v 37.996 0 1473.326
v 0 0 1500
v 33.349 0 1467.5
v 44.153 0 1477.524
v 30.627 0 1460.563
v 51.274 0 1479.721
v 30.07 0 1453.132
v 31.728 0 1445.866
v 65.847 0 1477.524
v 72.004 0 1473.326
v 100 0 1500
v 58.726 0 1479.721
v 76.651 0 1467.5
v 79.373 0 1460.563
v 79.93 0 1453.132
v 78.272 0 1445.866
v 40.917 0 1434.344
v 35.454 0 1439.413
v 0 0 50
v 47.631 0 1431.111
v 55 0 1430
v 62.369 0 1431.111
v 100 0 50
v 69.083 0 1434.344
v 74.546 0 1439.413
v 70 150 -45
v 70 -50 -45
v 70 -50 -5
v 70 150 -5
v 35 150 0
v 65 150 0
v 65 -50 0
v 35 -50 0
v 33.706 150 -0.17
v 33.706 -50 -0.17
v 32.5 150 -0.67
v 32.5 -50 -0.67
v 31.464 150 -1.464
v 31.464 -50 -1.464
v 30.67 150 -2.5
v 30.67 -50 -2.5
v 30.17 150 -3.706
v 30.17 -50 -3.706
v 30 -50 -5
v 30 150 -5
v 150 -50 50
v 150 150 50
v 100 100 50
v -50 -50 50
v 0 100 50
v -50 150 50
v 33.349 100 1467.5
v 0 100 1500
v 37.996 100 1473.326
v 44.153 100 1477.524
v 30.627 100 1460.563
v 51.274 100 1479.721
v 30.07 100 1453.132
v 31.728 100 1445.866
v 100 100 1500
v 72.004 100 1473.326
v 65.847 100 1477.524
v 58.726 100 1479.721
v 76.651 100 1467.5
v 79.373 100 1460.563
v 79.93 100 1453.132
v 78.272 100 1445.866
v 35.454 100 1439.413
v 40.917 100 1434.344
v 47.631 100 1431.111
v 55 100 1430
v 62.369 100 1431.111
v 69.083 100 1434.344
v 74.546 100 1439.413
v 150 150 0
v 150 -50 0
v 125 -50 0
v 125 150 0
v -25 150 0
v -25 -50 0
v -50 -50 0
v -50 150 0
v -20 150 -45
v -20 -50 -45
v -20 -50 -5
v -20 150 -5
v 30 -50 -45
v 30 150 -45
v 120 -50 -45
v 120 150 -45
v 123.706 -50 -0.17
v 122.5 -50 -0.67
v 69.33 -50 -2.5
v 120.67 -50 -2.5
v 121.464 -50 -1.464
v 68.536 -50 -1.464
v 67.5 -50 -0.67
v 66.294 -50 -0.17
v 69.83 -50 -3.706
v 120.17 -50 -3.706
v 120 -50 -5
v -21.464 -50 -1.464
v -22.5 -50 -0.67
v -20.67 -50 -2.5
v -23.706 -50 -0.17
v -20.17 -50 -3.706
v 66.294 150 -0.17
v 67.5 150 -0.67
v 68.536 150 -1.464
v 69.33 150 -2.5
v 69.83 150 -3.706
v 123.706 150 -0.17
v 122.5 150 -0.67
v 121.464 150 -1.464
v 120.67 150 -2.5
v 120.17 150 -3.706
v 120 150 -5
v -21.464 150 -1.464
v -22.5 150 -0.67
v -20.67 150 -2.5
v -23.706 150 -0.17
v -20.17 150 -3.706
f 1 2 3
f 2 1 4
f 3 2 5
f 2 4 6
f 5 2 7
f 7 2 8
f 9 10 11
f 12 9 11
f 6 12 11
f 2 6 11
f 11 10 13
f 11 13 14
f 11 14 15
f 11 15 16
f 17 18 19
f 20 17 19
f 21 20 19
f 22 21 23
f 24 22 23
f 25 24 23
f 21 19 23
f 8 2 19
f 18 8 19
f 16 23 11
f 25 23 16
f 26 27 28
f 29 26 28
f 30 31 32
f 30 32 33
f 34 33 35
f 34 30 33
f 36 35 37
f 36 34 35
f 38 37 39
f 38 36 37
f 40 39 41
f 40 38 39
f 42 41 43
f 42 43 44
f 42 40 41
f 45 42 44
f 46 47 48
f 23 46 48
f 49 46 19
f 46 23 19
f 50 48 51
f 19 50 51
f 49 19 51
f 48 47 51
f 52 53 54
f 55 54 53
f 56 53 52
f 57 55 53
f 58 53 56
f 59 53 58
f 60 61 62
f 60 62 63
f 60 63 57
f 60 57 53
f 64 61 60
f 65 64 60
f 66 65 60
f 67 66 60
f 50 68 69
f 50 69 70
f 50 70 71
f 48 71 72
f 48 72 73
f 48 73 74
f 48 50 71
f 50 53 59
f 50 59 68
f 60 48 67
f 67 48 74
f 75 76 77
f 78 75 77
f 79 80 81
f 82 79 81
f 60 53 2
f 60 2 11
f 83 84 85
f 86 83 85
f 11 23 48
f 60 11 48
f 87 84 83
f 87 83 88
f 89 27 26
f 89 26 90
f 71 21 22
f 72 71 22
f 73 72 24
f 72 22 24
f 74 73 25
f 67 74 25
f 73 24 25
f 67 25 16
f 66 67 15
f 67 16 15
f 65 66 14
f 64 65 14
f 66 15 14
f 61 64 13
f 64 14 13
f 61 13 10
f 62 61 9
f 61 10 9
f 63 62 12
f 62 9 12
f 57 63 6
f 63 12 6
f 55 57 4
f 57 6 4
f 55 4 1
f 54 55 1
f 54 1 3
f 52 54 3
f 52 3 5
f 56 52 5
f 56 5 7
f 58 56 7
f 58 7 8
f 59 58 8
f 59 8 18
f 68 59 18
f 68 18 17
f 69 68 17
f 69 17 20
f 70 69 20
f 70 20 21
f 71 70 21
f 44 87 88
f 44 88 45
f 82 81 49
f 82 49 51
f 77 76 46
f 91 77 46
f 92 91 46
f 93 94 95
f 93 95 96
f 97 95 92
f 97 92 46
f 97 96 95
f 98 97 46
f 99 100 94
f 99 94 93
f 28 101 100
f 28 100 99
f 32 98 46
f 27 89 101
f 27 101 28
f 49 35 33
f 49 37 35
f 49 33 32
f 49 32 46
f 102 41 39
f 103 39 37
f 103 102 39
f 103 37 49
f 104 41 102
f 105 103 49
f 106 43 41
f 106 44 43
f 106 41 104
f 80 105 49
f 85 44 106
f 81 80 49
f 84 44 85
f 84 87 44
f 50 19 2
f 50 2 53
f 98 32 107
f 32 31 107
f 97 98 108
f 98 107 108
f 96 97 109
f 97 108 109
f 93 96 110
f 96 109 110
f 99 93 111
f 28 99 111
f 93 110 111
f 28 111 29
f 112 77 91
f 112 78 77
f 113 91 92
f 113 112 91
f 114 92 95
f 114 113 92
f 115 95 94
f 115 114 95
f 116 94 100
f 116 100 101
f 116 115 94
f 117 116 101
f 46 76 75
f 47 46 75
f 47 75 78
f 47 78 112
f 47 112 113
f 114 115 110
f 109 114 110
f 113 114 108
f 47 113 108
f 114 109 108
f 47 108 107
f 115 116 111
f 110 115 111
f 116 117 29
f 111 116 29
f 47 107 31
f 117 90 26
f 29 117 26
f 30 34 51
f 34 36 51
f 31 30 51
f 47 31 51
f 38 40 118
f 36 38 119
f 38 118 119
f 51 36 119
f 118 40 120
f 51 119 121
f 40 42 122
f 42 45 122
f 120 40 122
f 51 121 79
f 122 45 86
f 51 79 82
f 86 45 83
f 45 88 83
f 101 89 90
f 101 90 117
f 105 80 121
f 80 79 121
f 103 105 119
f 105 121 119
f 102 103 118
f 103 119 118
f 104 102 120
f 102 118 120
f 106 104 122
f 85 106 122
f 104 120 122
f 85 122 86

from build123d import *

# Parameters (mm, degrees)
SKETCH2_W           = 100
SKETCH2_H           = 100
BOSS_EXTRUDE1_DEPTH = 1500
CUT_EXTRUDE1_REACH  = 1508.652
SKETCH3_R           = 25
SKETCH4_W           = 200
SKETCH4_H           = 200
BOSS_EXTRUDE2_DEPTH = 50
SKETCH5_W           = 50
SKETCH5_H           = 45
BOSS_EXTRUDE3_DEPTH = 200
FILLET1_R           = 5


with BuildPart() as part:
    # Sketch2 → Boss-Extrude1 (new body)
    with BuildSketch(Plane.XY):
        with Locations((50, 50)):
            Rectangle(SKETCH2_W, SKETCH2_H)
    extrude(amount=BOSS_EXTRUDE1_DEPTH)

    # Sketch3 → Cut-Extrude1 (cut, up to next)
    with BuildSketch(Plane.XZ, mode=Mode.PRIVATE) as cut_extrude1_sk1:
        with Locations(Location((55, 1455, 0), (0, 0, 270))):
            Circle(SKETCH3_R)
    cut_extrude1_tool1 = extrude(cut_extrude1_sk1.sketch, amount=-CUT_EXTRUDE1_REACH, mode=Mode.PRIVATE) & part.part
    add(cut_extrude1_tool1.solids().sort_by_distance((55, 0, 1455))[0], mode=Mode.SUBTRACT)

    # Sketch4 → Boss-Extrude2 (add)
    with BuildSketch(Plane(origin=(0, 0, 0), x_dir=(-1, 0, 0), z_dir=(0, 0, -1))):
        with Locations((-50, 50)):
            Rectangle(SKETCH4_W, SKETCH4_H)
    extrude(amount=-BOSS_EXTRUDE2_DEPTH)

    # Sketch5 → Boss-Extrude3 (add)
    with BuildSketch(Plane.XZ.offset(50)):
        with Locations((5, -22.5)):
            Rectangle(SKETCH5_W, SKETCH5_H)
        with Locations((95, -22.5)):
            Rectangle(SKETCH5_W, SKETCH5_H)
    extrude(amount=-BOSS_EXTRUDE3_DEPTH)

    # Fillet1
    fillet1_edges = [part.edges().sort_by_distance(p)[0] for p in [
        (30, 50, 0),
        (-20, 50, 0),
        (120, 50, 0),
        (70, 50, 0),
    ]]
    fillet(fillet1_edges, radius=FILLET1_R)


solid = part.part
